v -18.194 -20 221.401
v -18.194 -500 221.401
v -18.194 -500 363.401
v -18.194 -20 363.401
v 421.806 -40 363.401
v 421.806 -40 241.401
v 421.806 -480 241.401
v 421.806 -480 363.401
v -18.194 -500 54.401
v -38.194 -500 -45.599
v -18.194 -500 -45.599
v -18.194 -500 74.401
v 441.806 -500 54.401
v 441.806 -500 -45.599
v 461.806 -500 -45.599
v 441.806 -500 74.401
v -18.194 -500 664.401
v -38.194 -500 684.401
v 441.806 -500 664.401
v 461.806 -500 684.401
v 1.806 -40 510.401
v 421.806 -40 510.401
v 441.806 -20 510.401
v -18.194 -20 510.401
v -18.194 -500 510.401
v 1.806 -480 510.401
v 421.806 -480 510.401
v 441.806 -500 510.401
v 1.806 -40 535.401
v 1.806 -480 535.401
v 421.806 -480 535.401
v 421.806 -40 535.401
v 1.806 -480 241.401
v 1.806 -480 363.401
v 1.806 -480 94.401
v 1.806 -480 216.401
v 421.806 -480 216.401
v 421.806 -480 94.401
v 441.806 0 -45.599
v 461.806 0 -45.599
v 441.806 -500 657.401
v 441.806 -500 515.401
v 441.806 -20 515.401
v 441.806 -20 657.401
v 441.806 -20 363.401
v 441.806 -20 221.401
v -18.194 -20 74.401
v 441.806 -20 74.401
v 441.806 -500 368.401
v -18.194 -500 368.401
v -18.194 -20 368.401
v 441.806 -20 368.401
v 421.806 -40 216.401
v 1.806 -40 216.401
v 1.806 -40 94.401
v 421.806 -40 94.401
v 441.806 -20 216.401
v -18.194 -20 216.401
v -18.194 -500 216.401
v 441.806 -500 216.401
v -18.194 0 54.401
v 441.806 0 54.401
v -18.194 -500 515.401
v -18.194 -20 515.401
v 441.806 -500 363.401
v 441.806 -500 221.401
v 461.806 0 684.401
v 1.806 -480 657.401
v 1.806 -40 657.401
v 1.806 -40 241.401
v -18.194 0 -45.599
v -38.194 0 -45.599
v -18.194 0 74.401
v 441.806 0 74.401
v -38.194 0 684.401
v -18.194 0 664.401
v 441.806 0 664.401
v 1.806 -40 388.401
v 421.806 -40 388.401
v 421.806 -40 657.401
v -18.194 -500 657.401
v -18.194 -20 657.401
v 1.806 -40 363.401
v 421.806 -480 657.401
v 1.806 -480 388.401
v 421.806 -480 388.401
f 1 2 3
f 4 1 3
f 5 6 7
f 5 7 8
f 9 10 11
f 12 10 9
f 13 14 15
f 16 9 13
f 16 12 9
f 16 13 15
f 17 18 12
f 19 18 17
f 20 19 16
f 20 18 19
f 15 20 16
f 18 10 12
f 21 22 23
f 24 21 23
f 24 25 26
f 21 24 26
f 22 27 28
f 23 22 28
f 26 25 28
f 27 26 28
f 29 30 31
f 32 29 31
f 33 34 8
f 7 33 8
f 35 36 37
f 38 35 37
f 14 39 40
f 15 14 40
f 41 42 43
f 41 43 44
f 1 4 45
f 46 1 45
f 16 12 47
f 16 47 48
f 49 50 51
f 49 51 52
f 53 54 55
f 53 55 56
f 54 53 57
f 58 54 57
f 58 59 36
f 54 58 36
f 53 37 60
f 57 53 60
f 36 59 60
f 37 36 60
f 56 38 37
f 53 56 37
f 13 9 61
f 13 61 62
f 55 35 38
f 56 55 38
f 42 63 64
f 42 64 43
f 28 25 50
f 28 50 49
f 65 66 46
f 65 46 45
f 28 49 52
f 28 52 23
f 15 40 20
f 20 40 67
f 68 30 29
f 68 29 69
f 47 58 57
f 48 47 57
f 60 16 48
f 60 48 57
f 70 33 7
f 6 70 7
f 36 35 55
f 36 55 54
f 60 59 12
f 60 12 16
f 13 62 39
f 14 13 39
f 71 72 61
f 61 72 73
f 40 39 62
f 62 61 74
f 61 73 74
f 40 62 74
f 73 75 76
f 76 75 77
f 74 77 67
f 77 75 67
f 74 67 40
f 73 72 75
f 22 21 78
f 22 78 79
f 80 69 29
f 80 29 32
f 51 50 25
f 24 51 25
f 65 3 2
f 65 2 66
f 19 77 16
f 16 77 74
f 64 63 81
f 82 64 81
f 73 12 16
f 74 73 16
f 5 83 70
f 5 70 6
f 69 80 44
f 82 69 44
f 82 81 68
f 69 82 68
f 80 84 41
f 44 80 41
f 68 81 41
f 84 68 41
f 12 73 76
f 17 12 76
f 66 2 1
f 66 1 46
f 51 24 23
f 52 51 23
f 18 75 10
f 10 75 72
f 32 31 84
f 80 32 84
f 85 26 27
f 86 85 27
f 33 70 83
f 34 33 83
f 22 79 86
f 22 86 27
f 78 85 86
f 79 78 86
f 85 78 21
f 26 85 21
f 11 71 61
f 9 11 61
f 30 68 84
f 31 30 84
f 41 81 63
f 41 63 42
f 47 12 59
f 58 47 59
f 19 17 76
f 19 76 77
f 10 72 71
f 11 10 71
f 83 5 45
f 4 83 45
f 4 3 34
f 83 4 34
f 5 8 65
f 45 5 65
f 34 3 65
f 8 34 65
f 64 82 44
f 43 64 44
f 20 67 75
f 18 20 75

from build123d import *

# Parameters (mm, degrees)
F0_W     = 460
F0_H     = 20
F1_DEPTH = 500
F2_W     = 460
F2_H     = 142
F3_DEPTH = 480
F4_T     = -20
F4_2_T   = -20
F4_3_T   = -20
F4_4_T   = -20


with BuildPart() as f1:
    # F0 (on Front) → F1 (new body)
    with BuildSketch(Plane.XZ):
        Polygon((-18.1939336658, 664.4011205435), (-38.1939336658, 664.4011205435), (-38.1939336658, -45.5988794565), (-18.1939336658, -45.5988794565), (-18.1939336658, 54.4011205435), (-18.1939336658, 74.4011205435), align=None)
        Polygon((-38.1939336658, 684.4011205435), (-38.1939336658, 664.4011205435), (-18.1939336658, 664.4011205435), (441.8060663342, 664.4011205435), (461.8060663342, 664.4011205435), (461.8060663342, 684.4011205435), align=None)
        with Locations((211.8060663342, 64.4011205435)):
            Rectangle(F0_W, F0_H)
        Polygon((461.8060663342, 664.4011205435), (441.8060663342, 664.4011205435), (441.8060663342, 74.4011205435), (441.8060663342, 54.4011205435), (441.8060663342, -45.5988794565), (461.8060663342, -45.5988794565), align=None)
    extrude(amount=F1_DEPTH)


with BuildPart() as f3:
    # F2 (on face) → F3 (new body)
    with BuildSketch(Plane.XZ.offset(500)):
        with Locations((211.8060663342, 145.4011205435)):
            Rectangle(F2_W, F2_H)
    extrude(amount=-F3_DEPTH)

    # F4#4
    f4_4_openings = [f3.faces().sort_by_distance(p)[0] for p in [
        (211.806066, -260, 216.401121),
    ]]
    offset(amount=F4_4_T, openings=f4_4_openings)


with BuildPart() as f3b:
    # F2 (on face) → F3, piece 2 (new body)
    with BuildSketch(Plane.XZ.offset(500)):
        with Locations((211.8060663342, 292.4011251926)):
            Rectangle(F2_W, F2_H)
    extrude(amount=-F3_DEPTH)

    # F4#3
    f4_3_openings = [f3b.faces().sort_by_distance(p)[0] for p in [
        (211.806066, -260, 363.401125),
    ]]
    offset(amount=F4_3_T, openings=f4_3_openings)


with BuildPart() as f3c:
    # F2 (on face) → F3, piece 3 (new body)
    with BuildSketch(Plane.XZ.offset(500)):
        with Locations((211.8060663342, 439.4011251926)):
            Rectangle(F2_W, F2_H)
    extrude(amount=-F3_DEPTH)

    # F4#2
    f4_2_openings = [f3c.faces().sort_by_distance(p)[0] for p in [
        (211.806066, -260, 510.401125),
    ]]
    offset(amount=F4_2_T, openings=f4_2_openings)


with BuildPart() as f3d:
    # F2 (on face) → F3, piece 4 (new body)
    with BuildSketch(Plane.XZ.offset(500)):
        with Locations((211.8060663342, 586.4011249542)):
            Rectangle(F2_W, F2_H)
    extrude(amount=-F3_DEPTH)

    # F4
    f4_openings = [f3d.faces().sort_by_distance(p)[0] for p in [
        (211.806066, -260, 657.401125),
    ]]
    offset(amount=F4_T, openings=f4_openings)


solid = Compound([f1.part, f3.part, f3b.part, f3c.part, f3d.part])
